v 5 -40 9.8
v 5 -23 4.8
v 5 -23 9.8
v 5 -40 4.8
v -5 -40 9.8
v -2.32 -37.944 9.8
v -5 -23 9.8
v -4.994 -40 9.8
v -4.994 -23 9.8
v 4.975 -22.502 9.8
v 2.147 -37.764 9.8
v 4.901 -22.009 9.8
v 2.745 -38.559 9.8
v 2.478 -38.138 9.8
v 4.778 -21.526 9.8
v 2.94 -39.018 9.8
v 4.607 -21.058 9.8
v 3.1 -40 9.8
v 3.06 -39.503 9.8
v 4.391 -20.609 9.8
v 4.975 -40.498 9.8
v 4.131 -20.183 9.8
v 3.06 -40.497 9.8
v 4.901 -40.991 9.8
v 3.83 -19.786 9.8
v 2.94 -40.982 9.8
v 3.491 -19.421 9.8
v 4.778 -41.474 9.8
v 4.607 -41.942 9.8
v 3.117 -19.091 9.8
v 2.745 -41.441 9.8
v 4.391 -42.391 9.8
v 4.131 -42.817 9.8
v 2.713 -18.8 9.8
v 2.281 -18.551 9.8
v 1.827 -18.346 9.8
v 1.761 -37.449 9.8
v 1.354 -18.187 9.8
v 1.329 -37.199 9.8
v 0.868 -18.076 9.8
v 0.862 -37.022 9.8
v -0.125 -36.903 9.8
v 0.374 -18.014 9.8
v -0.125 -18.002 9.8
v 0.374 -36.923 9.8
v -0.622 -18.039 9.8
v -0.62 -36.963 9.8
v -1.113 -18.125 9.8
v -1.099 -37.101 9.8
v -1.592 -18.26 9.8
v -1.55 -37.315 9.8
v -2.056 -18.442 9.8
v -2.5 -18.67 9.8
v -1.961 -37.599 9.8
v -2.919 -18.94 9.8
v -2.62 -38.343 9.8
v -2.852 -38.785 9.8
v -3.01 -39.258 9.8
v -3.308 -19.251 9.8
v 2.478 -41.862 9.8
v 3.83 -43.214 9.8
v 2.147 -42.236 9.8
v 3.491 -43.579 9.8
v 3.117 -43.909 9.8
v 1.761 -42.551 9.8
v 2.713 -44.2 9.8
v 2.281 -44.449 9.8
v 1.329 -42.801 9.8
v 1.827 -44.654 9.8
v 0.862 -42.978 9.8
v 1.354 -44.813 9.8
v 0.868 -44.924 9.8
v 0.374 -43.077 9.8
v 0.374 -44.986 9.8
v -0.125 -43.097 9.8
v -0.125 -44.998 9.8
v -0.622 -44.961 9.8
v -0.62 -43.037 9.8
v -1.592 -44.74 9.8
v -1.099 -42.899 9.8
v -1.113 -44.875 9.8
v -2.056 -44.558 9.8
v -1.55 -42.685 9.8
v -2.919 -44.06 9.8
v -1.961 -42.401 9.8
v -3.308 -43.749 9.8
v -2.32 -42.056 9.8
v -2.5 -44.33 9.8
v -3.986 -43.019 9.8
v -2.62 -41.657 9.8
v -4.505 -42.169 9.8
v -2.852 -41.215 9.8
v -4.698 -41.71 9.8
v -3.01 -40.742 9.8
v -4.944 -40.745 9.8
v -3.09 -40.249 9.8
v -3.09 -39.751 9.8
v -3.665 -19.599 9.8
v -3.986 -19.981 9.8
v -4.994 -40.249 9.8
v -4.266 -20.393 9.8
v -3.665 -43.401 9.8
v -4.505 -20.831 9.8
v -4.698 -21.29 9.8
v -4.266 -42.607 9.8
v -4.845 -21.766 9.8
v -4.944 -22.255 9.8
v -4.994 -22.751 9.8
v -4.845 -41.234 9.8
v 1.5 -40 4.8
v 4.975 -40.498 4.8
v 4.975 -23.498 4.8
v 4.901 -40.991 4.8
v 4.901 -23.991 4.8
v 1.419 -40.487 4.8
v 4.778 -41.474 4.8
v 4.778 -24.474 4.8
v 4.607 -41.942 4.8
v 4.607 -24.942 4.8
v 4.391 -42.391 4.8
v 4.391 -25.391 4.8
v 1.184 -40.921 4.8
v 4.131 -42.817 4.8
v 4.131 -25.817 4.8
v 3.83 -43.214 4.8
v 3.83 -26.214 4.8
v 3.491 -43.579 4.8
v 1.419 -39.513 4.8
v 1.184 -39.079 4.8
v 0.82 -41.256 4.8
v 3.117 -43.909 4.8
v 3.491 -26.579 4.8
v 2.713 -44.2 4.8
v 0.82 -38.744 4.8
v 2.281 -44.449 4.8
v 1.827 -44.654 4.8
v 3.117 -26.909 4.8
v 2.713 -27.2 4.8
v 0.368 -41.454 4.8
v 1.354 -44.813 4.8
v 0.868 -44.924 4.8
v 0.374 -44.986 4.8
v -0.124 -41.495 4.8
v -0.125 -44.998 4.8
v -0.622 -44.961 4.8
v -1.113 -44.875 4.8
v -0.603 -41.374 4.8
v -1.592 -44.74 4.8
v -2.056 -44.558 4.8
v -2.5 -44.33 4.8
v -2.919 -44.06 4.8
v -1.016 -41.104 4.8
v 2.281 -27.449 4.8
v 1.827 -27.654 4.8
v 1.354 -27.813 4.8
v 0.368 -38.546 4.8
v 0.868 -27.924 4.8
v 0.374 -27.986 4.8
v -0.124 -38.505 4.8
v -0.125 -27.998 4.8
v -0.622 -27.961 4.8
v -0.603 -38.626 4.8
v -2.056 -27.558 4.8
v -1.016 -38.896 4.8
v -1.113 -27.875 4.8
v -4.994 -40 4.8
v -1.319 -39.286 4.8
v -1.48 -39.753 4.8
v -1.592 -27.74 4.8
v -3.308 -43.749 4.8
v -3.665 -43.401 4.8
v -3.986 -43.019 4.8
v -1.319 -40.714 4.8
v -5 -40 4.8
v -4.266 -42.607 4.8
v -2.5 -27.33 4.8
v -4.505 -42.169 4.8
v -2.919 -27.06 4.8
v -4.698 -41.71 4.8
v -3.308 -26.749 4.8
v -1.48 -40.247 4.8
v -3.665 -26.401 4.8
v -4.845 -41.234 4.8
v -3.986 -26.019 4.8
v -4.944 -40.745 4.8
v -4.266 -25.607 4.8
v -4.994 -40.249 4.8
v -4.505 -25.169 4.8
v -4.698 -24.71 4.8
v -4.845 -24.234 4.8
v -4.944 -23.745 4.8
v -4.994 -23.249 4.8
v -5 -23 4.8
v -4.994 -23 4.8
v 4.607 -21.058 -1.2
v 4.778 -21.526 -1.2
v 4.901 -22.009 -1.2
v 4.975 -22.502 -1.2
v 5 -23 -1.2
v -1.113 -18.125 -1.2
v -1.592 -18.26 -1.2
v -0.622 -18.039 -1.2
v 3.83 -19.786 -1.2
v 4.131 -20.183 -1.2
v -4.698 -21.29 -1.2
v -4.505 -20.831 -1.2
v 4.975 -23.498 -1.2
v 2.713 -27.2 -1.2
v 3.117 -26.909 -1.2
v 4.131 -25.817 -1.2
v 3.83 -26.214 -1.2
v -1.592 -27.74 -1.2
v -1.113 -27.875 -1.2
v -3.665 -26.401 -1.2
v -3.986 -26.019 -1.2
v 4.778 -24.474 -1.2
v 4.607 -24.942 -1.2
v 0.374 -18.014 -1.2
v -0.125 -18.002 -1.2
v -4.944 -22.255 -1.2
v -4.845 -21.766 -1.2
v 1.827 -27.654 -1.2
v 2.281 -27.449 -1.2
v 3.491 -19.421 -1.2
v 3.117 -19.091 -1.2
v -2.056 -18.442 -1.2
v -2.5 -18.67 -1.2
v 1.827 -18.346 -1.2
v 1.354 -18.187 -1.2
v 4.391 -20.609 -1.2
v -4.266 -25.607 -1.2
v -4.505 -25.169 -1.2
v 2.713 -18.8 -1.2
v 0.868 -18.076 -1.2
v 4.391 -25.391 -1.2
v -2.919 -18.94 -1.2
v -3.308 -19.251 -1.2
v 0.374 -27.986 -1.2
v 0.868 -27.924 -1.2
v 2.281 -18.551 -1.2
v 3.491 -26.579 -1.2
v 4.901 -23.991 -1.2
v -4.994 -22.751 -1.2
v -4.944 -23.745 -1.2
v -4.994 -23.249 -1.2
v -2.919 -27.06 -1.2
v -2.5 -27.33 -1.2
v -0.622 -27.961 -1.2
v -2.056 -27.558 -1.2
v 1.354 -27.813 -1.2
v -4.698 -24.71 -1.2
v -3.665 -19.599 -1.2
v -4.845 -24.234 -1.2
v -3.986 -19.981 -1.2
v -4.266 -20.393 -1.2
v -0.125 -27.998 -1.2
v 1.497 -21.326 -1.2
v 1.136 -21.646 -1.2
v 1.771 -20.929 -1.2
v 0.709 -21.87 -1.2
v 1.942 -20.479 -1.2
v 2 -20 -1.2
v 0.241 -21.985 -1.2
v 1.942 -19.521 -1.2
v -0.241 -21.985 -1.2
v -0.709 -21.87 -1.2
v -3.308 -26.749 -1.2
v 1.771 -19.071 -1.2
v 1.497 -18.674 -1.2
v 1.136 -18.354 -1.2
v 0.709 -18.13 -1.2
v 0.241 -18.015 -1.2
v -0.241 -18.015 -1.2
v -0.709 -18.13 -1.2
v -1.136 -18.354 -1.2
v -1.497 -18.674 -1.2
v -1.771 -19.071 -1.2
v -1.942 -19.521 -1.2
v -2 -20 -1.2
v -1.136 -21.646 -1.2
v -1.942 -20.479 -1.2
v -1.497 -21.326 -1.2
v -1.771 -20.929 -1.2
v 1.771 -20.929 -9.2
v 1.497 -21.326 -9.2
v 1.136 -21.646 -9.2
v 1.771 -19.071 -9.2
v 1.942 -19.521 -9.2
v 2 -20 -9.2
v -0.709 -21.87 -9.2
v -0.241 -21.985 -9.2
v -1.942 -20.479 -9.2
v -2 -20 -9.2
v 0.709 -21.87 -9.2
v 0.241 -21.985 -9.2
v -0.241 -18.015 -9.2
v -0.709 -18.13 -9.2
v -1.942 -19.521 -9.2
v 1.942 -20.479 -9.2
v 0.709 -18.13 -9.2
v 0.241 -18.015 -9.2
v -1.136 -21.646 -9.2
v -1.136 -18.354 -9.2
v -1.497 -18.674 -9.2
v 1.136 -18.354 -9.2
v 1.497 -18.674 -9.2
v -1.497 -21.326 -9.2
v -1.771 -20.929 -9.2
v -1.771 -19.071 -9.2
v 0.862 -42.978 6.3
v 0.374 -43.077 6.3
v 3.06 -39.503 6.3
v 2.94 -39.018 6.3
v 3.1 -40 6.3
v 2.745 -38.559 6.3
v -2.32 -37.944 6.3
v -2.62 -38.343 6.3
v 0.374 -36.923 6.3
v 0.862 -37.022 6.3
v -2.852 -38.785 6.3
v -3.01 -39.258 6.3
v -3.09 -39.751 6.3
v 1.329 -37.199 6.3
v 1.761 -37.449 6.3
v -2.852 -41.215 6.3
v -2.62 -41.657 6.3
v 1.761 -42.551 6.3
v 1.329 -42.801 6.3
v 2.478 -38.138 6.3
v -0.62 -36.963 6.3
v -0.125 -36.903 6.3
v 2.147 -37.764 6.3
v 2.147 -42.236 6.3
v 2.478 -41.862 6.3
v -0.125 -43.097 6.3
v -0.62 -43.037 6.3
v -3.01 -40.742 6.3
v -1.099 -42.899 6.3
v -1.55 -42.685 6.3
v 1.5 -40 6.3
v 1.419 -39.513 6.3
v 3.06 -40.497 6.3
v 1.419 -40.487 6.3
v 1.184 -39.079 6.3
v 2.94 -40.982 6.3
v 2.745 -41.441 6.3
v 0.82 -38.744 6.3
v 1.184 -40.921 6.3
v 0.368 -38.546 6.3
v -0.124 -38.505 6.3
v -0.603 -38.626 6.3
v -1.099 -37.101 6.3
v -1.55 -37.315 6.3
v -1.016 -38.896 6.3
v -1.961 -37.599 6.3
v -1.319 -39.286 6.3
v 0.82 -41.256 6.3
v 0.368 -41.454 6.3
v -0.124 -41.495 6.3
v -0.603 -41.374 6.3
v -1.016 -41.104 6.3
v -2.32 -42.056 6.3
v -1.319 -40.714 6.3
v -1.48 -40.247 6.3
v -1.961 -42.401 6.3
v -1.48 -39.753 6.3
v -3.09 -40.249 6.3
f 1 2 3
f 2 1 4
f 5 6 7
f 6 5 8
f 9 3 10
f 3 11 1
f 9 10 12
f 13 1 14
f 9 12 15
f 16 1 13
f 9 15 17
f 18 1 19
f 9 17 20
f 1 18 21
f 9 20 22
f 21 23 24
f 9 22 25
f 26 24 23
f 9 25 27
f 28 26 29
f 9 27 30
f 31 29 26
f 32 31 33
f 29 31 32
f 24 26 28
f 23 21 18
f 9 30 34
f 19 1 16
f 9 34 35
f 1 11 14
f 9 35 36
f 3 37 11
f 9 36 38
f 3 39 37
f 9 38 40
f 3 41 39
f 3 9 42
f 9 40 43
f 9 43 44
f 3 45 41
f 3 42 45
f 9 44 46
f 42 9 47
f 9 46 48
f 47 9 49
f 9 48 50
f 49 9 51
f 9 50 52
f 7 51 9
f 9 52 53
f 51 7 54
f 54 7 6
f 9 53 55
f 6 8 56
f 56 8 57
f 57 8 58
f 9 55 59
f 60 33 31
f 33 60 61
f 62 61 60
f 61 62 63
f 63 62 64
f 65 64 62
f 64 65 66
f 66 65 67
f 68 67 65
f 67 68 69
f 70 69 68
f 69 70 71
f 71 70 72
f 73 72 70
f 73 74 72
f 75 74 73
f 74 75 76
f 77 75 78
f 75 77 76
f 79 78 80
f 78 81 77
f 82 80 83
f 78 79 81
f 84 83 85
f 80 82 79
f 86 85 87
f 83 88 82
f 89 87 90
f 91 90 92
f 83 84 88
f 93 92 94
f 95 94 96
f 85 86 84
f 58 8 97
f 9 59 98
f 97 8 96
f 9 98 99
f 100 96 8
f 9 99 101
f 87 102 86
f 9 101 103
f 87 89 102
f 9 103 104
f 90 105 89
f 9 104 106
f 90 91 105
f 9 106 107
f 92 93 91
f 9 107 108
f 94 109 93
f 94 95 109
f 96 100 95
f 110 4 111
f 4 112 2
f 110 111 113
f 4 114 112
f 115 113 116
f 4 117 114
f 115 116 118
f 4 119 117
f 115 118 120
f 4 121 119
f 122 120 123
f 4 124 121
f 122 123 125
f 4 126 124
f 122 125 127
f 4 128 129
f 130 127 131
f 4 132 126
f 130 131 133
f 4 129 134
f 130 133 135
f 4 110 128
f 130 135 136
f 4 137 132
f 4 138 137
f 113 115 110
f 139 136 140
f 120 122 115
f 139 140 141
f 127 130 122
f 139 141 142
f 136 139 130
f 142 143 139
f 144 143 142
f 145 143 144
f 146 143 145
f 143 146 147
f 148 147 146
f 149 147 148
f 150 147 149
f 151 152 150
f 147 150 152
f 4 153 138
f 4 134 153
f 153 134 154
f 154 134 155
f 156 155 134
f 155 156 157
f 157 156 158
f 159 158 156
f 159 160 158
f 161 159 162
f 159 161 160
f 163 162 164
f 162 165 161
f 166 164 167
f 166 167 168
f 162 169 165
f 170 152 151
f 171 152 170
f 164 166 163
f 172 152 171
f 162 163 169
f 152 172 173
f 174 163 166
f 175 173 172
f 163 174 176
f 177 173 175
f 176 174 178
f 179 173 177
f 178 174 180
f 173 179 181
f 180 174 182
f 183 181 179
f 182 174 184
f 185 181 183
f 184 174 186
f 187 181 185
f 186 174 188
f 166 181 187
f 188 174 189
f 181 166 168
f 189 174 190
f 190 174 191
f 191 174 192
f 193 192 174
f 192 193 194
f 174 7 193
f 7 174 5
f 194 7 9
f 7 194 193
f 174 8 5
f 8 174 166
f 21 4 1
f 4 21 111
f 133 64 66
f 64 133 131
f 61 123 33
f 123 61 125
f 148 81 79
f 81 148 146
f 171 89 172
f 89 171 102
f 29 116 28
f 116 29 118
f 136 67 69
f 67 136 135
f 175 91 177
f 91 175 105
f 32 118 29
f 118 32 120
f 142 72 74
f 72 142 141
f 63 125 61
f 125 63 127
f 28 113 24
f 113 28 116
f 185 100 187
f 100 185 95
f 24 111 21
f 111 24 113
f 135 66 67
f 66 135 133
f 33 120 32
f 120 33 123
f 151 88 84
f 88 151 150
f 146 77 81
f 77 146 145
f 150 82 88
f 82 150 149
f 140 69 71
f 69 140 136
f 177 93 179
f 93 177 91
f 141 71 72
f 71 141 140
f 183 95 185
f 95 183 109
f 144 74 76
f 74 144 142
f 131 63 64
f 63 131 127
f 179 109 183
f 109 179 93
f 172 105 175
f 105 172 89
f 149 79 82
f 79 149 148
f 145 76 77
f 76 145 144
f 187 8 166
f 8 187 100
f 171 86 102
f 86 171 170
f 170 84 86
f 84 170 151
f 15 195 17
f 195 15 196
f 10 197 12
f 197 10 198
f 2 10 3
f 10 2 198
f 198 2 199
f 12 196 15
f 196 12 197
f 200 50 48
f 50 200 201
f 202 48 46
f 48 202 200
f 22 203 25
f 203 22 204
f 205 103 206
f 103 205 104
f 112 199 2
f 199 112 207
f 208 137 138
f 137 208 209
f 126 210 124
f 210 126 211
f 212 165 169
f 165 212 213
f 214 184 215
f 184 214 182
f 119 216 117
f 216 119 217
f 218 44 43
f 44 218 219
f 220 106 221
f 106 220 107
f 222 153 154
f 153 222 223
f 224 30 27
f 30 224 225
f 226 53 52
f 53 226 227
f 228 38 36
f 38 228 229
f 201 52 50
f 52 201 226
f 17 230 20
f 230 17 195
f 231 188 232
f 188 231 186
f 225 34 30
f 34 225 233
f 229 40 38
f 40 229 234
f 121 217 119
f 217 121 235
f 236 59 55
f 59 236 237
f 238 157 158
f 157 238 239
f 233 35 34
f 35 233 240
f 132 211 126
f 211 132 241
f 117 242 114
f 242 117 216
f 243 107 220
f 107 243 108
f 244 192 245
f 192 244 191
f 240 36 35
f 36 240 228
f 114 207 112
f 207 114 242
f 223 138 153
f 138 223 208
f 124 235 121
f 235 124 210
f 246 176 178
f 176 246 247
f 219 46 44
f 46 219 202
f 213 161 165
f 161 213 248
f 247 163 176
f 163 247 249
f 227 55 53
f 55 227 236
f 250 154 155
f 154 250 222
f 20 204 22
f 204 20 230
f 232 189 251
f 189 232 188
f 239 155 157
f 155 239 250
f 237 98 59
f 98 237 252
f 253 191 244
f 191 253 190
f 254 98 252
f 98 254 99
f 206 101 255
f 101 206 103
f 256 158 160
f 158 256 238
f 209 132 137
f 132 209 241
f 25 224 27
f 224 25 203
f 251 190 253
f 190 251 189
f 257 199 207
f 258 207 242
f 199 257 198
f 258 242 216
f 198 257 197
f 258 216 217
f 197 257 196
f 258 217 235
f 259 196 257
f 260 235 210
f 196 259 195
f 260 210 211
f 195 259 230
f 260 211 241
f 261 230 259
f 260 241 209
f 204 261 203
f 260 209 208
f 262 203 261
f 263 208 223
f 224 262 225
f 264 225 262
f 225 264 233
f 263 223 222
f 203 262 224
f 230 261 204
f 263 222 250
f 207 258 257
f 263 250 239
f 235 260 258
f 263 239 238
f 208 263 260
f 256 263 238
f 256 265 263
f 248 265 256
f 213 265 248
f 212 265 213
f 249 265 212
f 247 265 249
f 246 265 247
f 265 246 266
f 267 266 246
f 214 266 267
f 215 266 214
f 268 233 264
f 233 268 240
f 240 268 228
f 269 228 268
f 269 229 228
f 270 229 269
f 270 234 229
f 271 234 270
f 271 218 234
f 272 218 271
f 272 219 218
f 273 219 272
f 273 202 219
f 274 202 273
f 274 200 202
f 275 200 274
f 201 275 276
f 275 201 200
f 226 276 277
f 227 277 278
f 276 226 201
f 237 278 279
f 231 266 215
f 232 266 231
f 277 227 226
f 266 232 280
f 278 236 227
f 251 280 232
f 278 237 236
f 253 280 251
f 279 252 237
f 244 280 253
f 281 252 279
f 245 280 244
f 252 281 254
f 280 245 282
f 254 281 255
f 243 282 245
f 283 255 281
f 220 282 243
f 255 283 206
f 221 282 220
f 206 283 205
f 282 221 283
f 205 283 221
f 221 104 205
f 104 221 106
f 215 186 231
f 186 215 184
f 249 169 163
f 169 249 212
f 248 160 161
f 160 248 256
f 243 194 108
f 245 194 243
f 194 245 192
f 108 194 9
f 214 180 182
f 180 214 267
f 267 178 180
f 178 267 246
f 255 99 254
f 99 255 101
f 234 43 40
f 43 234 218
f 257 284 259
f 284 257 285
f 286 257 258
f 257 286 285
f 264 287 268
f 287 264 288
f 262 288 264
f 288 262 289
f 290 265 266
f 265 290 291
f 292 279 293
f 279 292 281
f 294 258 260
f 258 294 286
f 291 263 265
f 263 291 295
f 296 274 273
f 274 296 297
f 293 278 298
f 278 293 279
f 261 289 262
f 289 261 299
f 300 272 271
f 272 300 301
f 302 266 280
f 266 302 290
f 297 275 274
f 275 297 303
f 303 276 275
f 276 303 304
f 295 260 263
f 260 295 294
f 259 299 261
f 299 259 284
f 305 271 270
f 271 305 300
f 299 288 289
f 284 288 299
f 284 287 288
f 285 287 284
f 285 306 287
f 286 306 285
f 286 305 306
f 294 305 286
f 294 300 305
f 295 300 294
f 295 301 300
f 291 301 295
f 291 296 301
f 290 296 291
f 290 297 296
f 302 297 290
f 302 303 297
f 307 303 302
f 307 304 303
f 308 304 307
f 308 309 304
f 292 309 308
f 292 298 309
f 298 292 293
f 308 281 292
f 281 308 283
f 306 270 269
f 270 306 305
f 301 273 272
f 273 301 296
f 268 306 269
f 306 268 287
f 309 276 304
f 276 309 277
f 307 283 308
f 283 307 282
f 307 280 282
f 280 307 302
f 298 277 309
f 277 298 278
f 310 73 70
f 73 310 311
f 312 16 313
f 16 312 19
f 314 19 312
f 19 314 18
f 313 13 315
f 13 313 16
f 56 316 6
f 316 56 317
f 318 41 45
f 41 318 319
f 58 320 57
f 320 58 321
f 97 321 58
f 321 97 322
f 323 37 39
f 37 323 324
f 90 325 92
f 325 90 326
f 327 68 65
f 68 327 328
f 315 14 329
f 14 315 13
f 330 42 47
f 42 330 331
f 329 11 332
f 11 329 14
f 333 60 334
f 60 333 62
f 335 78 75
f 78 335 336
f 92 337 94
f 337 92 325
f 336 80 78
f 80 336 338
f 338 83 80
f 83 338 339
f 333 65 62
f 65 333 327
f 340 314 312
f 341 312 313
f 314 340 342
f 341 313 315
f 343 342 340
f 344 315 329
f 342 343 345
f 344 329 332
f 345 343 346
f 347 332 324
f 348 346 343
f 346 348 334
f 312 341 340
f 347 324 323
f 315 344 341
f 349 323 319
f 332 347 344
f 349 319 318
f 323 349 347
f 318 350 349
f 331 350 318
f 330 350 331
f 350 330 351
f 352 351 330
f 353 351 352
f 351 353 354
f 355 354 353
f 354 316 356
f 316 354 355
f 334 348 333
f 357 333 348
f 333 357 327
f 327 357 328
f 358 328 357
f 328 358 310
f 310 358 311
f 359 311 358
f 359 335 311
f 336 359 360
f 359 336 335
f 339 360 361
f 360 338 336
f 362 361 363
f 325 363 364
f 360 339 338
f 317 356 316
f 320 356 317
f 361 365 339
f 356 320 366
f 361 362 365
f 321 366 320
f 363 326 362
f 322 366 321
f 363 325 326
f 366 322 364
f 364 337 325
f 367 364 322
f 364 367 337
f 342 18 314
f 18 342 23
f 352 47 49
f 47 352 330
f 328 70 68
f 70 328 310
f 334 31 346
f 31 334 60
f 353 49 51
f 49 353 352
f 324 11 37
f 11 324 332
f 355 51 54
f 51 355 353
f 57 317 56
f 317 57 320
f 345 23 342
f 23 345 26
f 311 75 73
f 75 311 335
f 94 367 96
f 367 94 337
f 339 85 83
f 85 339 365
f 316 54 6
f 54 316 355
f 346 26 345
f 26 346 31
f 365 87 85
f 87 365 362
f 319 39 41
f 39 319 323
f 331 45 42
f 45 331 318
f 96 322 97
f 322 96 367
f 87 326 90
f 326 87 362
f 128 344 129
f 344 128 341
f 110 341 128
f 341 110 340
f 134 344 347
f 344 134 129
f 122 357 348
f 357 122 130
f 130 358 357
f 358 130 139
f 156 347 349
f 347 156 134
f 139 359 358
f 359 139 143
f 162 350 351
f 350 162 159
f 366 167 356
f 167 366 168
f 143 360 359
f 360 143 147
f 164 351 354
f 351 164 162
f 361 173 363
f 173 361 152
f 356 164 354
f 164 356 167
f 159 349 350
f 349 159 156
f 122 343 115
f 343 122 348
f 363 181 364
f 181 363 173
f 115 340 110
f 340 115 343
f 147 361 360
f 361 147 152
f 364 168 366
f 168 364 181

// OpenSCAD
// file: frontWheel.scad
// this file defines the front wheel


// global definitions
$fa = 5;
$fs = 0.5;


// shows front wheel
frontWheel();


// front wheel
module frontWheel()
{
  difference()
  {
    union()
    {
      difference()
      {
        // basic wheel
        rotate([0,90,0]) cylinder(d = 60,h = 20);

        // shape rim
        translate([10,0,0]) rotate([0,90,0]) cylinder(d1 = 30, d2 = 50, h = 20);
      }
      
      // support to hold shaft
      rotate([0,90,0]) cylinder(d = 12,h = 15);
    }
  
    // hole for shaft
    rotate([0,90,0]) cylinder(d = 6,h = 20, center = true);
  }
}
// file: frontAxle.scad
// this file defines the front axle


// used modules
use <copy.scad>


// used parts
use <frontWheel.scad>


// global definitions
$fa = 5;
$fs = 0.5;


// shows front axle
frontAxle();


// assembled front axle
module frontAxle()
{
  translate([0,0,-12.5])
  {
    // axle beam
    axleBeamTop();
    axleBeamBottom();
    
    // steering knuckles
    translate([42.5,0,0]) steeringKnuckle();
    translate([-42.5,0,0]) doubleSteeringKnuckle();
    
    rotateCopy([0,180,0])
    {
      // shafts
      translate([42,0,0]) shaft();
      
      // wheels
      translate([50,0,0]) frontWheel();
    }
    
    // steering rod
    translate([0,27,4.6]) steeringRod();
  }
}


// axle beam: top half
module axleBeamTop()
{
  difference()
  {
    union()
    {
      // basic beam
      cube([90,8,25], center = true);
      
      // roundings
      mirrorCopy([1,0,0]) translate([45,0,0]) cylinder(d = 8, h = 25, center = true);
      
      // support to mound axle
      mirrorCopy([1,0,0]) translate([20,0,0]) cube([10,15,25], center = true);
    }
    
    mirrorCopy([1,0,0])
    {
      // remove material for steering knuckles
      translate([45,0,0]) cube([20,10,15.2], center = true);
    
      // holes for steering knuckles
      translate([45,0,0]) cylinder(d = 4.1, h = 30, center = true);
      
      // holes for screws to mount axle
      translate([20,0,0]) cylinder(d = 4.1, h = 30, center = true);
    }
    
    // remove bottom half
    translate([0,0,-10]) cube([100,20,20], center = true);
  }
}


// axle beam: bottom half
module axleBeamBottom()
{
  difference()
  {
    // rotated top beam
    rotate([180,0,0]) axleBeamTop();
    
    // remove unused material at the bottom
    translate([0,0,-11]) cube([50.1,20,7], center = true);
    
    // holes for nuts
    mirrorCopy([1,0,0]) translate([20,0,-15]) cylinder(d = 8, h = 11, $fn = 6);
  }
}


// doubled steering knuckle
module doubleSteeringKnuckle()
{
  rotate([0,0,180]) mirrorCopy([0,1,0]) steeringKnuckle();
}


// steering knuckle
module steeringKnuckle()
{
  difference()
  {
    union()
    {
      // shaft holder
      translate([3.5,0,0]) cube([7,15,15], center = true);
      
      // axle beam joint
      translate([2.5,0,0]) cylinder(d = 4, h = 24, center = true);
      
      // steering arm
      rotate([0,0,20]) translate([5.9,17,0]) cube([6.5,25,5], center = true);
    }
    
    // hole for shaft
    rotate([0,90,0]) cylinder(d = 8, h = 15, center = true);
    
    // hole for steering track rod
    translate([-3.5,27,-3]) cylinder(d = 4.1, h = 6);
  }
}


// steering track rod
module steeringRod()
{
  // basic rod
  cube([78,7,4], center = true);
  
  mirrorCopy([1,0,0])
  {
    // roundings
    translate([39,0,0]) cylinder(d = 7, h = 4, center = true);

    // steering knuckle joints
    translate([39,0,-9]) cylinder(d = 4, h = 9);
  }
}


// shaft
module shaft()
{
  // basic shaft
  rotate([0,90,0]) cylinder(d = 6, h = 13);
  
  // wheel stop
  rotate([0,90,0]) cylinder(d = 7.7, h = 8);
  
  // end stop
  rotate([0,-90,0]) cylinder(d = 12, h = 2);
}
// file: servo.scad
// this file defines the steering servo


// used modules
use <copy.scad>


// global definitions
$fa = 5;
$fs = 0.5;


// shows steering servo
servo();


// steering servo
module servo()
{
  difference()
  {
    union()
    {
      // servo housing
      translate([0,0,-7]) cube([12,29.5,26], center = true);
      
      // servo mount
      translate([0,0,1]) cube([12,40,2], center = true);
       
      translate([0,5,0]) 
      {
        // servo shaft housing
        cylinder(d = 13, h = 10);
        
        // servo shaft
        cylinder(d = 5.5, h = 13.5);
      }
      
      // gear housing
      translate([0,-2,0]) cylinder(d = 9, h = 10);
    }
    
    // remove material from shaft housing
    mirrorCopy([1,0,0]) translate([6,0,-1]) cube([10,10,12]);
    
    // hole in servo shaft
    translate([0,5,10]) cylinder(d = 2, h = 10);
    
    // holes to mount servo
    mirrorCopy([0,1,0]) translate([0,18,-1]) cylinder(d = 5, h = 4);
  }
}
// file: copy.scad
// this file defines various copy functions


// this function copies his children and rotates the copies

// v: rotation vector
// n: number of copies
// center: rotate on both sides equally
module rotateCopy(v = [0,0,0], n = 1, center = false)
{
  // calculate rotation offset if center is true
  rotationOffset = -n*v/2;
  
  // copy rotate
  for (i = [0:n])
  {
    if (center)
    {
      rotate(i*v + rotationOffset) children();
    }
    else
    { 
      rotate(i*v) children();
    }
  }
}


// this function copies his children and translates the copies

// v: translation vector
// n: number of copies
// center: translate on both sides equally
module translateCopy(v = [0,0,0], n = 1, center = false)
{
  // calculate translation offset if center is true
  translationOffset = -n*v/2;
  
  // copy and translate
  for (i = [0:n])
  {
    if (center) 
    {
      translate(i*v + start) children();
    }
    else 
    {
      translate(i*v) children();
    }
  }
}


// this function copies his children and mirrors the copy

// v: mirror vector
module mirrorCopy(v = [1,0,0])
{
  children();
  mirror(v) children();
}


// this function copies his children in a grid
// translation, size and centering can be set for each dimension x,y,z

// v: translation vector
// size: size of grid
// center: translate on both sides equally
module linearGrid(v = [0,0,0], size = [1,1,1], center = [false,false,false])
{
  if (is_num(v))
  {
    // expand v to 3 dimensions
    linearGrid([v,v,v], size, center) children();
  }
  else if (is_num(size))
  {
    // expand size to 3 dimensions
    linearGrid(v, [size,size,size], center) children();
  }
  else if (is_num(center))
  {
    // expand center to 3 dimensions
    linearGrid(v, size, [center,center,center]) children();
  }
  else
  {
    translateCopy([1,0,0]*v[0], size[0]-1, center[0])
    translateCopy([0,1,0]*v[1], size[1]-1, center[1])
    translateCopy([0,0,1]*v[2], size[2]-1, center[2])
      children();
  }
}
// main file
// this file defines the steering mechanism


// used modules
use <copy.scad>


// used parts
use <servo.scad>
use <frontAxle.scad>


// global definitions
$fa = 5;
$fs = 0.5;


// shows assembled steering mechanism
steering();


// assembled steering mechanism
module steering()
{
  // steering servo
  translate([0,-35,20]) rotate([180,0,0]) servo();
  
  // servo arm
  !servoArm();
  
  // steering arm
  steeringArm();
}


// servo arm
module servoArm()
{
  translate([0,-30,7.3]) difference()
  {
    union()
    {
      // basic arm
      translate([0,-1.5,0]) cube([10,17,5], center = true);
    
      // roundings
      translate([0,-10,0]) cylinder(d = 10, h = 5, center = true);
      translate([0,7,-3]) cylinder(d = 10, h = 11, center = true);
      
      // steering arm joint
      translate([0,10,-16.5]) cylinder(d = 4, h = 9.5);
    }
    
    // hole for servo shaft
    translate([0,-10,-1]) cylinder(d = 6.2, h = 4);
    
    // hole for screw
    translate([0,-10,0]) cylinder(d = 3, h = 6, center = true);
  }
}


// steering arm
module steeringArm()
{
  translate([0,-20,-6]) difference()
  {
    rotate([0,0,10.2]) translate([-19.8,0,0]) 
    {
      // basic arm
      cube([39.6,8,4], center = true);
      
      // roundings
      mirrorCopy([1,0,0]) translate([19.8,0,0]) cylinder(d = 8, h = 4, center = true);
      
      // steering knuckle joint
      translate([-19.8,0,-9]) cylinder(d = 3.5, h = 9);
    }
    
    // hole for servo arm
    cylinder(d = 5, h = 5, center = true);
  }
}
